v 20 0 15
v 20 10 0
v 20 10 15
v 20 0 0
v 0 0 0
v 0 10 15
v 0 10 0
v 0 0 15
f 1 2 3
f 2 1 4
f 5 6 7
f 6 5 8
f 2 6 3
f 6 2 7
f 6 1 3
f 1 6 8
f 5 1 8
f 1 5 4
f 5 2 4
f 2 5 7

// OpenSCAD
//rotate([0,0,90])
//rotate([90,90,90])
//linear_extrude(height = 5, center = true, convexity = 10)
//polygon(t);

//#translate([10,0,0])
//rotate([0,-90,0])
//linear_extrude(height = 20, center = true, convexity = 10)
//polygon(t);
// 
// cube(20);
 
 
 module cubeWithTopOverhang(width, length, height, hang)
 {
     t = [[0,0],[hang,0],[0,hang]];
     cube([width, length, height]);
     
     #translate([0,length,height])
     rotate([180,0,0])
     {
        translate([width/2,0,0])
        rotate([0,-90,0])
        linear_extrude(height = width, center = true, convexity = 10)
        polygon(t);

        translate([width/2,length,0])
        rotate([90,-90,90])
        linear_extrude(height = width, center = true, convexity = 10)
        polygon(t);
             
        translate([0,length/2,0])
        rotate([270,-90,0])
        linear_extrude(height = length, center = true, convexity = 10)
        polygon(t);
             
        translate([width,length/2,0])
        rotate([90,-90,0])
        linear_extrude(height = length, center = true, convexity = 10)
        polygon(t);   
     }
}

 module bottomOverhang(width, length, height, hang)
 {
     t = [[0,0],[hang,0],[0,hang]];
     cube([width, length, height]);
     w = width + hang;
     l = length + hang;
     h = height + hang;
     
     
     translate([-hang/2,l-hang/2,0])
     rotate([180,0,0])
     {
        translate([w/2,0,0])
        rotate([0,-90,0])
        linear_extrude(height = w, center = true, convexity = 10)
        polygon(t);

        translate([w/2,l,0])
        rotate([90,-90,90])
        linear_extrude(height = w, center = true, convexity = 10)
        polygon(t);
             
        translate([0,l/2,0])
        rotate([270,-90,0])
        linear_extrude(height = l, center = true, convexity = 10)
        polygon(t);
             
        translate([w,l/2,0])
        rotate([90,-90,0])
        linear_extrude(height = l, center = true, convexity = 10)
        polygon(t);   
     }
}

// cube(20);
//translate([0,20,0])
// rotate([180,0,0])
cubeWithTopOverhang(20,10,15,2);
